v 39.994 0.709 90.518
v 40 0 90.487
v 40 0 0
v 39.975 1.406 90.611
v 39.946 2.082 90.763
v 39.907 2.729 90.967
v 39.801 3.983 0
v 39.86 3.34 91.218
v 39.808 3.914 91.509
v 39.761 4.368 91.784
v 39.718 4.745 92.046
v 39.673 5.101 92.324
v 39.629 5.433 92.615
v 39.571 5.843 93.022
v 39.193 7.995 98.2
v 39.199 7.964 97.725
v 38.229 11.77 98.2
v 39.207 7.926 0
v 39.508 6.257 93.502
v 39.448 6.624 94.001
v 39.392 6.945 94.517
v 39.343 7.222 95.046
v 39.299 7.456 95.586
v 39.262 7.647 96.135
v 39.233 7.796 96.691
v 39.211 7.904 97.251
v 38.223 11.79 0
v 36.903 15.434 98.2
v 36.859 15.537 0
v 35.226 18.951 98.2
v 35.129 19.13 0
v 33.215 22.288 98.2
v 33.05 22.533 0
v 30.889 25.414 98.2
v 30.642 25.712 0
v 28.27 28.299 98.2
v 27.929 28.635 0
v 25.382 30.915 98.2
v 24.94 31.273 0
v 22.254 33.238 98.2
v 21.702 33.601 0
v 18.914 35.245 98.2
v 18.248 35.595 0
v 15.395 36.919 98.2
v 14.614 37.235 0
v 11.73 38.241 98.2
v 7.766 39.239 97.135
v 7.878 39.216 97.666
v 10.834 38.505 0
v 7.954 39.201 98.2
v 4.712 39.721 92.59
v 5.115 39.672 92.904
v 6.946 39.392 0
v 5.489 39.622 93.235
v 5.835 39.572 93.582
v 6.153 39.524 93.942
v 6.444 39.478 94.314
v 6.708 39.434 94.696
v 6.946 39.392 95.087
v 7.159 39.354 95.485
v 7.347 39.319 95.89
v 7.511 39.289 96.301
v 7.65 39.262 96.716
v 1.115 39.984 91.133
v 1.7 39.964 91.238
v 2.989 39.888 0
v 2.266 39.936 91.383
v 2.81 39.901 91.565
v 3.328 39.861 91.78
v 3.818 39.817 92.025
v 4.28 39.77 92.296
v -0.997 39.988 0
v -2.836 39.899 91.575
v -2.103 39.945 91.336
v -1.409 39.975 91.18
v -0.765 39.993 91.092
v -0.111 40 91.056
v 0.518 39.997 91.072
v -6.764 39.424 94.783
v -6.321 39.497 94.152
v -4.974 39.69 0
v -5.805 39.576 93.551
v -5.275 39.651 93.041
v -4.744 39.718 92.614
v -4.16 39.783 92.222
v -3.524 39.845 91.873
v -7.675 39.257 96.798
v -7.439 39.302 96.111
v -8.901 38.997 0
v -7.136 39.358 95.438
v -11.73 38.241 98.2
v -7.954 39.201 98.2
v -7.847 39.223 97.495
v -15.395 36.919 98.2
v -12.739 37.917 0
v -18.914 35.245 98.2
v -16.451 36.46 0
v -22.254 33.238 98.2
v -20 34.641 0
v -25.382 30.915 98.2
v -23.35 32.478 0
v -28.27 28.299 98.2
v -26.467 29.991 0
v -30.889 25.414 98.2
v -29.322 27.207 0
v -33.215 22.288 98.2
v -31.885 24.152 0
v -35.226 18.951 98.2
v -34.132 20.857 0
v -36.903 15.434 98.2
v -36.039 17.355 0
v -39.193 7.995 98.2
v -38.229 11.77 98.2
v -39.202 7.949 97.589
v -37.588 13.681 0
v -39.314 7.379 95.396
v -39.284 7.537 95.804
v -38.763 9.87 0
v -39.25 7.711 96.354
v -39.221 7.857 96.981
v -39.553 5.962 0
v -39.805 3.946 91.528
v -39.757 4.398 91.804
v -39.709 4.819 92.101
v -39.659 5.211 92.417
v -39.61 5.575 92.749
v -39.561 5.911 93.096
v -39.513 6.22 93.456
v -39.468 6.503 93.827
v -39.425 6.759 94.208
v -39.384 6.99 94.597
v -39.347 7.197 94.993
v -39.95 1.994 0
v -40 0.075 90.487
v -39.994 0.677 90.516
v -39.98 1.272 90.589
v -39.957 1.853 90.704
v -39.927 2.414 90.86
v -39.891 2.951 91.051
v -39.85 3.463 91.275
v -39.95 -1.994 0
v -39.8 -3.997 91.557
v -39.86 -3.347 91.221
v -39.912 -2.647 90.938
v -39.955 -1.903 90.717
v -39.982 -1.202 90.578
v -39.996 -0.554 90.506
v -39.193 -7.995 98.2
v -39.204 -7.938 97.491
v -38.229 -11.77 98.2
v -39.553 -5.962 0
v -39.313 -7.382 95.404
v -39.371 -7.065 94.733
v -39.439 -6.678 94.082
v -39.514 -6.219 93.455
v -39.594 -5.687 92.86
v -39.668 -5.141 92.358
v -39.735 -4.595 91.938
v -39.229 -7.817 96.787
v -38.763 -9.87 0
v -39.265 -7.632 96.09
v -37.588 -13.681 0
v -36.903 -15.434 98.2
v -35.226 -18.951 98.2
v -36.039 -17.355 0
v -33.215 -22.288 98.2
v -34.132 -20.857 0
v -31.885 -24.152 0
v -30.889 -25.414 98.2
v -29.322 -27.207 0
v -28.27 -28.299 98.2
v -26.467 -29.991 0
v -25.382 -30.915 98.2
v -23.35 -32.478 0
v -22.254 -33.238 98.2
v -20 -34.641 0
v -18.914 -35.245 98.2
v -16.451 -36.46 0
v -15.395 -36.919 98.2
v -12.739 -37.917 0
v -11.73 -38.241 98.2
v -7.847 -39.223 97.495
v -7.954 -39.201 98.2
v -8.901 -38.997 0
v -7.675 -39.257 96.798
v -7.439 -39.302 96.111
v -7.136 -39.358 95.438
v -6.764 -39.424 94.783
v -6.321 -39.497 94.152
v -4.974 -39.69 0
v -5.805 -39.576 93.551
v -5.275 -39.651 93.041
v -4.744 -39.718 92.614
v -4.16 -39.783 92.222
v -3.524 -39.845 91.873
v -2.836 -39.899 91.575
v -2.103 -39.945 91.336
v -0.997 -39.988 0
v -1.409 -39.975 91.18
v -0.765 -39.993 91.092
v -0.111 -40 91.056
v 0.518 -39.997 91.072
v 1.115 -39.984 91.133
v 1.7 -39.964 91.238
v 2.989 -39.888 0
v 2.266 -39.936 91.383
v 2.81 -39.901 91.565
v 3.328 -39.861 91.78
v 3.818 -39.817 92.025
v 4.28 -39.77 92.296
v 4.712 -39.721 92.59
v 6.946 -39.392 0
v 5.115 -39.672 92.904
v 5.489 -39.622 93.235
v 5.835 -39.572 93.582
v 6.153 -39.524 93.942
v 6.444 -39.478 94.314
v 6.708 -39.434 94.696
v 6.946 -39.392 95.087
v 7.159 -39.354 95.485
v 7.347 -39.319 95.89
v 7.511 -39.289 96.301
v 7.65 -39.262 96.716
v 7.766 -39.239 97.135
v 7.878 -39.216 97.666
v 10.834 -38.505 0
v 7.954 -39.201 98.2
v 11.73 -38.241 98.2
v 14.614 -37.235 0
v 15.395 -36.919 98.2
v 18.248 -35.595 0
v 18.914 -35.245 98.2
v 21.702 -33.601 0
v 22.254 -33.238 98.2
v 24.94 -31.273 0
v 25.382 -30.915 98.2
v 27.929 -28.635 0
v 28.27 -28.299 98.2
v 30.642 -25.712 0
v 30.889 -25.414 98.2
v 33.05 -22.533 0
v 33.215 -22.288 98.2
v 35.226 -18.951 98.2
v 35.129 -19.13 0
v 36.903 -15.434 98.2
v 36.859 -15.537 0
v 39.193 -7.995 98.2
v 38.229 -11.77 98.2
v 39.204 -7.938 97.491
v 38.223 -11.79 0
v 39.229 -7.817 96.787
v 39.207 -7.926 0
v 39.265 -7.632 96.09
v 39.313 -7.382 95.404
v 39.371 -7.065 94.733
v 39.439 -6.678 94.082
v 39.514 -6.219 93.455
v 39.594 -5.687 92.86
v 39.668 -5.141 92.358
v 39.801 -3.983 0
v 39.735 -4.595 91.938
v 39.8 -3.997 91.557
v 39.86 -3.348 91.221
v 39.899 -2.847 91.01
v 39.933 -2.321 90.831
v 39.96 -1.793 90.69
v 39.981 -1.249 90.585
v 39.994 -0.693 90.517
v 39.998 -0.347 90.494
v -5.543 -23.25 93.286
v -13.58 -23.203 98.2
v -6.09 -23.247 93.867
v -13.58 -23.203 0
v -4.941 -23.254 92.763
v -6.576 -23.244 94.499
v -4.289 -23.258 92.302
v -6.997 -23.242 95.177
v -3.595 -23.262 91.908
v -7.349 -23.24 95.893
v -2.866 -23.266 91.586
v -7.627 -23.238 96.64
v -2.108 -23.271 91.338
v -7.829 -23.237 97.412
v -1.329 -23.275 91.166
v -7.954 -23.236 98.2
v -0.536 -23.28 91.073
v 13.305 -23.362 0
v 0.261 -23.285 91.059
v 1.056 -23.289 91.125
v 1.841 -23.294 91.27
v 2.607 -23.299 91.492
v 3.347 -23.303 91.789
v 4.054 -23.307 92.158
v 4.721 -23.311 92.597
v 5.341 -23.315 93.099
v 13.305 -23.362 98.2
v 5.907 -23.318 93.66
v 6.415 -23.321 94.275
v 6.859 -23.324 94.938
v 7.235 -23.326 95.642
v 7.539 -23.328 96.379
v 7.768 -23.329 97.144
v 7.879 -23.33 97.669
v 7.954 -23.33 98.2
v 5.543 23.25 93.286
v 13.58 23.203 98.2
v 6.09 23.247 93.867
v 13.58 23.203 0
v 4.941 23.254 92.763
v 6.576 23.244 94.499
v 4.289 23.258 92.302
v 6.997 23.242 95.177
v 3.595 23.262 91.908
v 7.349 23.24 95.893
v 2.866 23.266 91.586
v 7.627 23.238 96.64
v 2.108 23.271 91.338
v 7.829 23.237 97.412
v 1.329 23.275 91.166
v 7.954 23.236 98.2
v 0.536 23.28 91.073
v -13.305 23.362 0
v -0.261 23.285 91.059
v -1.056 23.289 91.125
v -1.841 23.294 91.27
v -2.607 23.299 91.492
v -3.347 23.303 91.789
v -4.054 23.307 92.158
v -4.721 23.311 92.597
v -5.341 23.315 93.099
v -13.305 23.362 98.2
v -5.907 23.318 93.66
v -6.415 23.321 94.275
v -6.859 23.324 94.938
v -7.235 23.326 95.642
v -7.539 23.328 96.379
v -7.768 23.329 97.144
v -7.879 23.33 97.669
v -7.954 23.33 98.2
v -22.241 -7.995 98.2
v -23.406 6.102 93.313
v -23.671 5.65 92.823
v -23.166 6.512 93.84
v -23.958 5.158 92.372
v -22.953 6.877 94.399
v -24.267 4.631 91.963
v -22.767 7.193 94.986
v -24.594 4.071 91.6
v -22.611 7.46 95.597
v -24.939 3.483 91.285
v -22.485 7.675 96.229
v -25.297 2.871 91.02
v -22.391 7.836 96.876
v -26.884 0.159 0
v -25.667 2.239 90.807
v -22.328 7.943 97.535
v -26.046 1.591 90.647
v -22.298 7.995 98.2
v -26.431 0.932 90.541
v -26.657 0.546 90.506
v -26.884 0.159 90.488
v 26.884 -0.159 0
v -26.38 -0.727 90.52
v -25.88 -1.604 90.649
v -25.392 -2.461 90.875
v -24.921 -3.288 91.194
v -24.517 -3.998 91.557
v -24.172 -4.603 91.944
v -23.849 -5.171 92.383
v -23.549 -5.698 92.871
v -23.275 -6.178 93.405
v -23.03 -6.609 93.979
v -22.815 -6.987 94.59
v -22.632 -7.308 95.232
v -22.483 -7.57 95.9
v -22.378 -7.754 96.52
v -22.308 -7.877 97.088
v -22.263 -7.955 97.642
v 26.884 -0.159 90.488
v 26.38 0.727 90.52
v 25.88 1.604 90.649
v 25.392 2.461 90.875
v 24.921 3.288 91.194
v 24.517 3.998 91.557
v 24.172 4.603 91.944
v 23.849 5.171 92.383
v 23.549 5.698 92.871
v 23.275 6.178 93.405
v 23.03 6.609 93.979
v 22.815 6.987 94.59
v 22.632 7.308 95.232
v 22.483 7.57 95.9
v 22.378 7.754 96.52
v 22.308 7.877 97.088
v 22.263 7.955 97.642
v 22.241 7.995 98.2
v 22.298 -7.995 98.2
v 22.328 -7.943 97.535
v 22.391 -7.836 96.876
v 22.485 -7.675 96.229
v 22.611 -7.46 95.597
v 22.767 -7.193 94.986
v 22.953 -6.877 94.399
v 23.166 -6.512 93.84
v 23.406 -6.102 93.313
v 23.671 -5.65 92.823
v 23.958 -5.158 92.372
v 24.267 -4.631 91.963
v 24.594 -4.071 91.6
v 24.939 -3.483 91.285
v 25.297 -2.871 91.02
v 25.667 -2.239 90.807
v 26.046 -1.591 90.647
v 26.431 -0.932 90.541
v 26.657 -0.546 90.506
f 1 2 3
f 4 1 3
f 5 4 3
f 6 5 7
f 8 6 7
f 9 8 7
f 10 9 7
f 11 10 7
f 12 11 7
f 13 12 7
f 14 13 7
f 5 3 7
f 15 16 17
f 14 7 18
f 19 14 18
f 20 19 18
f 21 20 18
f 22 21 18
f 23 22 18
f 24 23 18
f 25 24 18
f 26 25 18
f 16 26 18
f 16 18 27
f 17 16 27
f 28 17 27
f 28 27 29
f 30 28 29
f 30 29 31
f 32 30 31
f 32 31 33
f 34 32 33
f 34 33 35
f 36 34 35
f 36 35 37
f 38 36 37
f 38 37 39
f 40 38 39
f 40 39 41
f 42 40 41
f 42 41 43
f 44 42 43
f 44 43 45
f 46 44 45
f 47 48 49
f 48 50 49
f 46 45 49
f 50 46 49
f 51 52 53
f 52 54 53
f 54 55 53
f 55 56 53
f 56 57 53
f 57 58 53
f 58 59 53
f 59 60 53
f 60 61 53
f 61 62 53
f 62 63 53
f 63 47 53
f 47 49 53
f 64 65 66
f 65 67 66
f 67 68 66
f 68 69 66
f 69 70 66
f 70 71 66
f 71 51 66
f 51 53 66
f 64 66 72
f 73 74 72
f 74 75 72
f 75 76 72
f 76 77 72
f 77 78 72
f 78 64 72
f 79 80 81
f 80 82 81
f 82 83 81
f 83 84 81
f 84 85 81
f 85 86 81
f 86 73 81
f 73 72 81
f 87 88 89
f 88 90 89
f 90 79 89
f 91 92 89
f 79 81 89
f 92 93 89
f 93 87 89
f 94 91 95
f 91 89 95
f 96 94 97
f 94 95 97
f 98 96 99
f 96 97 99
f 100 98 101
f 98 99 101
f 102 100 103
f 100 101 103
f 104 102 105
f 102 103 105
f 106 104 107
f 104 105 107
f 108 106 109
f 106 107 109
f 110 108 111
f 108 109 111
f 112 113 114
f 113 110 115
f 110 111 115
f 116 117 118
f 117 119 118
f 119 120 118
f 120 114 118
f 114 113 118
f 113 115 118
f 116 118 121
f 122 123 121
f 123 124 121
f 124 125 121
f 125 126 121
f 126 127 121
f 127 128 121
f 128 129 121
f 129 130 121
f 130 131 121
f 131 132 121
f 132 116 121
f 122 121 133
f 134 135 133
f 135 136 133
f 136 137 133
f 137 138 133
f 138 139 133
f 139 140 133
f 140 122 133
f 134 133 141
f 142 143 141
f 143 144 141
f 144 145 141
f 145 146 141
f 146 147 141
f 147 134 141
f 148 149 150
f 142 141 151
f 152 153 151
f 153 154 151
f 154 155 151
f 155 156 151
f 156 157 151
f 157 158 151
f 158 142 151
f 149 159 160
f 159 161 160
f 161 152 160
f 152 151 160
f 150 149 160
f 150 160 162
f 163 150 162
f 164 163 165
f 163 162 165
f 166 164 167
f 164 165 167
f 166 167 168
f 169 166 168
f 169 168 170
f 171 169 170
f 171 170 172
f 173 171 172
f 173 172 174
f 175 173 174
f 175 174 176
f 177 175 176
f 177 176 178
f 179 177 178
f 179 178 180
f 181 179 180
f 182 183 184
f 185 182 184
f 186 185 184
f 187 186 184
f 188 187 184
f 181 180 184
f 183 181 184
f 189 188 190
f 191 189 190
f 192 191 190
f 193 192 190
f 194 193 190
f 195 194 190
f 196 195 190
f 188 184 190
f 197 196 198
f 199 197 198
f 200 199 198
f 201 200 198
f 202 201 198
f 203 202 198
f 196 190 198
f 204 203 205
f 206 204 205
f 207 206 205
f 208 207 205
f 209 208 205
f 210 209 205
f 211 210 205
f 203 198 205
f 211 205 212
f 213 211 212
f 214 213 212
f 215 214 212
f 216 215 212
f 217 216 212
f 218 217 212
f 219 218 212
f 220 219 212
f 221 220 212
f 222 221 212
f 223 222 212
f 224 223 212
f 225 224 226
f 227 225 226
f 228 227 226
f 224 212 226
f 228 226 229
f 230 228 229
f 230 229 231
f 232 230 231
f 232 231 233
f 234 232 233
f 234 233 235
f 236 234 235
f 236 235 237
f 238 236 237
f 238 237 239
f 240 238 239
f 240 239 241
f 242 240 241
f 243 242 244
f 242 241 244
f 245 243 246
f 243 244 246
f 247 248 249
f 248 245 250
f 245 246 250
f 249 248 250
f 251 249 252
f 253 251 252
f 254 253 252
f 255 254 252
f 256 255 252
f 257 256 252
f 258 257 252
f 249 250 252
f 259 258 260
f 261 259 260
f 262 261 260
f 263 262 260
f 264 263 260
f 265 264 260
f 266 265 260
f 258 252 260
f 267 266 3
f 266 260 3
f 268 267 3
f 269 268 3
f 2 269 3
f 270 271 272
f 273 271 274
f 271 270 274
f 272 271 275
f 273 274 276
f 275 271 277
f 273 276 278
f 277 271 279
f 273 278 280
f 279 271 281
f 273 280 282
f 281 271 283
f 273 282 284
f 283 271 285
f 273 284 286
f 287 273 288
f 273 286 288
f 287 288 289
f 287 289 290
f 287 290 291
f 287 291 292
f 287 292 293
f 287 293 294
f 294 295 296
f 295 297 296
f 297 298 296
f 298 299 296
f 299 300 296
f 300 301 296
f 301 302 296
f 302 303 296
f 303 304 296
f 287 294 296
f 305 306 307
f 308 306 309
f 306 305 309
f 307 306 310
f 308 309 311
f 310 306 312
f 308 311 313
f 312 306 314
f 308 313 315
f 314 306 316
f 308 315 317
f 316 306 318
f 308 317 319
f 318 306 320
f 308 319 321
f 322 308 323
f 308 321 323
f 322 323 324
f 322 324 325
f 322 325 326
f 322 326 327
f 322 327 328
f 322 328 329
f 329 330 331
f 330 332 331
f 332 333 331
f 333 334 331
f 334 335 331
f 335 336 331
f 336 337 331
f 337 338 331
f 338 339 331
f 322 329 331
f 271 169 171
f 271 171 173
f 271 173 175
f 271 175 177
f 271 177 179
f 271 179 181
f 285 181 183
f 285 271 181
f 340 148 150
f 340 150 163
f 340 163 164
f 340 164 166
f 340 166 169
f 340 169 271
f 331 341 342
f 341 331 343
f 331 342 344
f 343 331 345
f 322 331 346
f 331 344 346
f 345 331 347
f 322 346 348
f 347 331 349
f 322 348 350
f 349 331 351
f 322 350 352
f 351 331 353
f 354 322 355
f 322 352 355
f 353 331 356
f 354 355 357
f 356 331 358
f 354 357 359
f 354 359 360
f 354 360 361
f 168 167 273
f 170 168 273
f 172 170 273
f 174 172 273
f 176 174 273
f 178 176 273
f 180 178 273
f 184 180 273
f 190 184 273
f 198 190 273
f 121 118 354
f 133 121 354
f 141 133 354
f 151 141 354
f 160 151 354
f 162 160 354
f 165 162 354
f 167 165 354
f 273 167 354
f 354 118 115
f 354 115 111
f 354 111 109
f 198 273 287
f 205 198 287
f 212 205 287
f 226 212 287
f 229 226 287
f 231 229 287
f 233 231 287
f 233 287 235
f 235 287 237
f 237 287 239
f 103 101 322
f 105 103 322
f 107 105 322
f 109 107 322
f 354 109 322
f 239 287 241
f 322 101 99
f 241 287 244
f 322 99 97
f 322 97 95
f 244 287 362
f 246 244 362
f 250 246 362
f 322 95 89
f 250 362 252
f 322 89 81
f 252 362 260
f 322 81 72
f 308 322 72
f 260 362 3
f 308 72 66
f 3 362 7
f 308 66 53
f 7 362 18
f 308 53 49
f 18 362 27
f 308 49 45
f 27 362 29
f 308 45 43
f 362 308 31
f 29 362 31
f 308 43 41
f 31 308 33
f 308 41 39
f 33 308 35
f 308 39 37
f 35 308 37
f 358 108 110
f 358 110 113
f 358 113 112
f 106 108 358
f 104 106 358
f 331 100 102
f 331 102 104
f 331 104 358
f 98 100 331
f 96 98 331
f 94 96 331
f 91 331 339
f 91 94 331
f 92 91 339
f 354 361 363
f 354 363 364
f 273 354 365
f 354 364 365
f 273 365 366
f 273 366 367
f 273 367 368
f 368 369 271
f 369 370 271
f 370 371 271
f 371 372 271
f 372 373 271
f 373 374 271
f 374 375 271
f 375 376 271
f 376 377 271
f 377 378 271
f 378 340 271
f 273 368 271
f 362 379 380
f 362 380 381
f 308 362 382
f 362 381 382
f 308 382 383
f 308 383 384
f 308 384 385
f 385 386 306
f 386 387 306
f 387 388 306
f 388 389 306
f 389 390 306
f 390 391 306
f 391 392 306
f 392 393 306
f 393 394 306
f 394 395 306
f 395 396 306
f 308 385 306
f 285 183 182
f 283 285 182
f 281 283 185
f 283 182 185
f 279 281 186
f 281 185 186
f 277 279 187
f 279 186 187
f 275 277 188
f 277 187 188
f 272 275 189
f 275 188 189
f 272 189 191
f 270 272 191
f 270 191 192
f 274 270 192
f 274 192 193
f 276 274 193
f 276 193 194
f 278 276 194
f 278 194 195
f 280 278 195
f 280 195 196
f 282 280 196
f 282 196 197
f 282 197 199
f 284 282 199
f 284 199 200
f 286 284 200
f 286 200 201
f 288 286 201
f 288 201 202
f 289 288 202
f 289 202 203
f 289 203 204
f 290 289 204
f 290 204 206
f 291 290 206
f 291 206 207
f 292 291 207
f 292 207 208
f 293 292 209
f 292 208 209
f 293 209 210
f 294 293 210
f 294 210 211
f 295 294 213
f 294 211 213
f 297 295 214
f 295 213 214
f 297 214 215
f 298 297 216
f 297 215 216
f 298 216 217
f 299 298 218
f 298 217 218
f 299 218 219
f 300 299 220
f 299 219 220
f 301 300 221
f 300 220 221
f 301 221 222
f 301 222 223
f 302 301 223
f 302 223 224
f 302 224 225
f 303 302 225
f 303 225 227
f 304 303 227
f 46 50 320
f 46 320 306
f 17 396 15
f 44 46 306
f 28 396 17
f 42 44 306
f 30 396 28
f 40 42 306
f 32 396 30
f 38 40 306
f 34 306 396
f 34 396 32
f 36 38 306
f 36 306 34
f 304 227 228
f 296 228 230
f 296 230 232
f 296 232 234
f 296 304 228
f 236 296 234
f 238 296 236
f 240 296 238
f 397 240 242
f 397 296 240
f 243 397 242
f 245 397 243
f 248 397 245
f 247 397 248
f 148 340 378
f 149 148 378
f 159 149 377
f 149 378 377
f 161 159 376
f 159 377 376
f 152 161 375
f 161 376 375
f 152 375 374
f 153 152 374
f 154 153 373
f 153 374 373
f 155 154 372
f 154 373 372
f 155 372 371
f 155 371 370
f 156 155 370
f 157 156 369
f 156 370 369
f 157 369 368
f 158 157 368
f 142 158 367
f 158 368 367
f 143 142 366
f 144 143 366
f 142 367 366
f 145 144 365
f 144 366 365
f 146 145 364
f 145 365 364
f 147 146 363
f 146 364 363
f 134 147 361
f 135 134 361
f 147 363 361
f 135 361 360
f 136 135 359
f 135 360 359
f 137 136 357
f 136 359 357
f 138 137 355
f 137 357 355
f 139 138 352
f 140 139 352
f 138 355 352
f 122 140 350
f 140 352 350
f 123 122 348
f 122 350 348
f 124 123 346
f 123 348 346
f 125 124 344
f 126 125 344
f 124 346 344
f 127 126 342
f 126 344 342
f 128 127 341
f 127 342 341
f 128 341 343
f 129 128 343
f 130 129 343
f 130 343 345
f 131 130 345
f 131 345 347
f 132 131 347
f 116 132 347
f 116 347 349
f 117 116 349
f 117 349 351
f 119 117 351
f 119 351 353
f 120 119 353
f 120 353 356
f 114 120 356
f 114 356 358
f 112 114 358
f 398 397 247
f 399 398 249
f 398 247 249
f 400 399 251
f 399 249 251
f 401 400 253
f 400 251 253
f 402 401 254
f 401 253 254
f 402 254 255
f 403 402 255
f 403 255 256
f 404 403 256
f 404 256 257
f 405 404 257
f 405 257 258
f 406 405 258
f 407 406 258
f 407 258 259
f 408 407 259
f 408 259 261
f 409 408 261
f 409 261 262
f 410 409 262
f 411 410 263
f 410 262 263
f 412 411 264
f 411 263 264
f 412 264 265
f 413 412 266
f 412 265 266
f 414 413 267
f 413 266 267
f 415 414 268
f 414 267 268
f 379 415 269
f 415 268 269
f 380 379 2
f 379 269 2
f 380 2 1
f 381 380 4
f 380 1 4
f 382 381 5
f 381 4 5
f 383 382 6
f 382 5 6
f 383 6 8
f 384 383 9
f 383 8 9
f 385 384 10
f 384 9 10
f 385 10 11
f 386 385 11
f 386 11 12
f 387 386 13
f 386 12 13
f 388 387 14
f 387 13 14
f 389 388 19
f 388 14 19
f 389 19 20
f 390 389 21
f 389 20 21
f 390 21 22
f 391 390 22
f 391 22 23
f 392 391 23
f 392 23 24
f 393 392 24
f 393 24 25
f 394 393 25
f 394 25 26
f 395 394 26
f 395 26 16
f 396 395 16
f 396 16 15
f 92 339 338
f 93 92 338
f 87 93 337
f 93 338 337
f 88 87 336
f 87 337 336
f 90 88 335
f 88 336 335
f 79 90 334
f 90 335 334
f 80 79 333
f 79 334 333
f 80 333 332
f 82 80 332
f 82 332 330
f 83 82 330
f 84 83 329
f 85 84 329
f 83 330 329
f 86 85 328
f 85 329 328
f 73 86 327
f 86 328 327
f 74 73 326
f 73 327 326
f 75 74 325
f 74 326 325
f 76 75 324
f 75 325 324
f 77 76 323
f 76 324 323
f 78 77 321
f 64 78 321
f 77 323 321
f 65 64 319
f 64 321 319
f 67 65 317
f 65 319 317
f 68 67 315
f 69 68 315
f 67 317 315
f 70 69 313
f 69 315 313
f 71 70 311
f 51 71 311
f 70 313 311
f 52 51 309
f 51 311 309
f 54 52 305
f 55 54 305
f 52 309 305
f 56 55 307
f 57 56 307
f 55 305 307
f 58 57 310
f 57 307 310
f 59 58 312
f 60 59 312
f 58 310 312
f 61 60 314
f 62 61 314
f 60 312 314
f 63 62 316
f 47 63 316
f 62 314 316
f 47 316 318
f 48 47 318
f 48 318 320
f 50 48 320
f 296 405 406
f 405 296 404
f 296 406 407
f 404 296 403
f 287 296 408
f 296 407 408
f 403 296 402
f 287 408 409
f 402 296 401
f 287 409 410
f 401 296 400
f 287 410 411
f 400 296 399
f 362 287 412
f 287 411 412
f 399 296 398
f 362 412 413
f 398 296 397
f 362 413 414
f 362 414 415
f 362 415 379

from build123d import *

# Parameters (mm, degrees)
F0_R     = 40
F1_DEPTH = 98.2
F3_DEPTH = 100
F5_R     = 8
F6_DEPTH = 200
F8_R     = 8
F9_DEPTH = 100


with BuildPart() as f1:
    # F0 (on Top) → F1 (new body)
    with BuildSketch(Plane.XY):
        Circle(F0_R)
    extrude(amount=F1_DEPTH)

    # F2 (on face) → F3 (cut)
    with BuildSketch(Plane.XY.offset(98.2)):
        Polygon((26.884189, -0.158689), (13.579523, 23.203046), (-13.304666, 23.361735), (-26.884189, 0.158689), (-13.579523, -23.203046), (13.304666, -23.361735), align=None)
    extrude(amount=-F3_DEPTH, mode=Mode.SUBTRACT)

    # F5 (on offset) → F6 (cut)
    with BuildSketch(Plane.XZ.offset(45)):
        with Locations((0, 99.055015)):
            Circle(F5_R)
    extrude(amount=-F6_DEPTH, mode=Mode.SUBTRACT)

    # F8 (on offset) → F9 (cut)
    with BuildSketch(Plane.YZ.offset(50)):
        with Locations((0, 98.486878)):
            Circle(F8_R)
    extrude(amount=-F9_DEPTH, mode=Mode.SUBTRACT)


solid = f1.part
